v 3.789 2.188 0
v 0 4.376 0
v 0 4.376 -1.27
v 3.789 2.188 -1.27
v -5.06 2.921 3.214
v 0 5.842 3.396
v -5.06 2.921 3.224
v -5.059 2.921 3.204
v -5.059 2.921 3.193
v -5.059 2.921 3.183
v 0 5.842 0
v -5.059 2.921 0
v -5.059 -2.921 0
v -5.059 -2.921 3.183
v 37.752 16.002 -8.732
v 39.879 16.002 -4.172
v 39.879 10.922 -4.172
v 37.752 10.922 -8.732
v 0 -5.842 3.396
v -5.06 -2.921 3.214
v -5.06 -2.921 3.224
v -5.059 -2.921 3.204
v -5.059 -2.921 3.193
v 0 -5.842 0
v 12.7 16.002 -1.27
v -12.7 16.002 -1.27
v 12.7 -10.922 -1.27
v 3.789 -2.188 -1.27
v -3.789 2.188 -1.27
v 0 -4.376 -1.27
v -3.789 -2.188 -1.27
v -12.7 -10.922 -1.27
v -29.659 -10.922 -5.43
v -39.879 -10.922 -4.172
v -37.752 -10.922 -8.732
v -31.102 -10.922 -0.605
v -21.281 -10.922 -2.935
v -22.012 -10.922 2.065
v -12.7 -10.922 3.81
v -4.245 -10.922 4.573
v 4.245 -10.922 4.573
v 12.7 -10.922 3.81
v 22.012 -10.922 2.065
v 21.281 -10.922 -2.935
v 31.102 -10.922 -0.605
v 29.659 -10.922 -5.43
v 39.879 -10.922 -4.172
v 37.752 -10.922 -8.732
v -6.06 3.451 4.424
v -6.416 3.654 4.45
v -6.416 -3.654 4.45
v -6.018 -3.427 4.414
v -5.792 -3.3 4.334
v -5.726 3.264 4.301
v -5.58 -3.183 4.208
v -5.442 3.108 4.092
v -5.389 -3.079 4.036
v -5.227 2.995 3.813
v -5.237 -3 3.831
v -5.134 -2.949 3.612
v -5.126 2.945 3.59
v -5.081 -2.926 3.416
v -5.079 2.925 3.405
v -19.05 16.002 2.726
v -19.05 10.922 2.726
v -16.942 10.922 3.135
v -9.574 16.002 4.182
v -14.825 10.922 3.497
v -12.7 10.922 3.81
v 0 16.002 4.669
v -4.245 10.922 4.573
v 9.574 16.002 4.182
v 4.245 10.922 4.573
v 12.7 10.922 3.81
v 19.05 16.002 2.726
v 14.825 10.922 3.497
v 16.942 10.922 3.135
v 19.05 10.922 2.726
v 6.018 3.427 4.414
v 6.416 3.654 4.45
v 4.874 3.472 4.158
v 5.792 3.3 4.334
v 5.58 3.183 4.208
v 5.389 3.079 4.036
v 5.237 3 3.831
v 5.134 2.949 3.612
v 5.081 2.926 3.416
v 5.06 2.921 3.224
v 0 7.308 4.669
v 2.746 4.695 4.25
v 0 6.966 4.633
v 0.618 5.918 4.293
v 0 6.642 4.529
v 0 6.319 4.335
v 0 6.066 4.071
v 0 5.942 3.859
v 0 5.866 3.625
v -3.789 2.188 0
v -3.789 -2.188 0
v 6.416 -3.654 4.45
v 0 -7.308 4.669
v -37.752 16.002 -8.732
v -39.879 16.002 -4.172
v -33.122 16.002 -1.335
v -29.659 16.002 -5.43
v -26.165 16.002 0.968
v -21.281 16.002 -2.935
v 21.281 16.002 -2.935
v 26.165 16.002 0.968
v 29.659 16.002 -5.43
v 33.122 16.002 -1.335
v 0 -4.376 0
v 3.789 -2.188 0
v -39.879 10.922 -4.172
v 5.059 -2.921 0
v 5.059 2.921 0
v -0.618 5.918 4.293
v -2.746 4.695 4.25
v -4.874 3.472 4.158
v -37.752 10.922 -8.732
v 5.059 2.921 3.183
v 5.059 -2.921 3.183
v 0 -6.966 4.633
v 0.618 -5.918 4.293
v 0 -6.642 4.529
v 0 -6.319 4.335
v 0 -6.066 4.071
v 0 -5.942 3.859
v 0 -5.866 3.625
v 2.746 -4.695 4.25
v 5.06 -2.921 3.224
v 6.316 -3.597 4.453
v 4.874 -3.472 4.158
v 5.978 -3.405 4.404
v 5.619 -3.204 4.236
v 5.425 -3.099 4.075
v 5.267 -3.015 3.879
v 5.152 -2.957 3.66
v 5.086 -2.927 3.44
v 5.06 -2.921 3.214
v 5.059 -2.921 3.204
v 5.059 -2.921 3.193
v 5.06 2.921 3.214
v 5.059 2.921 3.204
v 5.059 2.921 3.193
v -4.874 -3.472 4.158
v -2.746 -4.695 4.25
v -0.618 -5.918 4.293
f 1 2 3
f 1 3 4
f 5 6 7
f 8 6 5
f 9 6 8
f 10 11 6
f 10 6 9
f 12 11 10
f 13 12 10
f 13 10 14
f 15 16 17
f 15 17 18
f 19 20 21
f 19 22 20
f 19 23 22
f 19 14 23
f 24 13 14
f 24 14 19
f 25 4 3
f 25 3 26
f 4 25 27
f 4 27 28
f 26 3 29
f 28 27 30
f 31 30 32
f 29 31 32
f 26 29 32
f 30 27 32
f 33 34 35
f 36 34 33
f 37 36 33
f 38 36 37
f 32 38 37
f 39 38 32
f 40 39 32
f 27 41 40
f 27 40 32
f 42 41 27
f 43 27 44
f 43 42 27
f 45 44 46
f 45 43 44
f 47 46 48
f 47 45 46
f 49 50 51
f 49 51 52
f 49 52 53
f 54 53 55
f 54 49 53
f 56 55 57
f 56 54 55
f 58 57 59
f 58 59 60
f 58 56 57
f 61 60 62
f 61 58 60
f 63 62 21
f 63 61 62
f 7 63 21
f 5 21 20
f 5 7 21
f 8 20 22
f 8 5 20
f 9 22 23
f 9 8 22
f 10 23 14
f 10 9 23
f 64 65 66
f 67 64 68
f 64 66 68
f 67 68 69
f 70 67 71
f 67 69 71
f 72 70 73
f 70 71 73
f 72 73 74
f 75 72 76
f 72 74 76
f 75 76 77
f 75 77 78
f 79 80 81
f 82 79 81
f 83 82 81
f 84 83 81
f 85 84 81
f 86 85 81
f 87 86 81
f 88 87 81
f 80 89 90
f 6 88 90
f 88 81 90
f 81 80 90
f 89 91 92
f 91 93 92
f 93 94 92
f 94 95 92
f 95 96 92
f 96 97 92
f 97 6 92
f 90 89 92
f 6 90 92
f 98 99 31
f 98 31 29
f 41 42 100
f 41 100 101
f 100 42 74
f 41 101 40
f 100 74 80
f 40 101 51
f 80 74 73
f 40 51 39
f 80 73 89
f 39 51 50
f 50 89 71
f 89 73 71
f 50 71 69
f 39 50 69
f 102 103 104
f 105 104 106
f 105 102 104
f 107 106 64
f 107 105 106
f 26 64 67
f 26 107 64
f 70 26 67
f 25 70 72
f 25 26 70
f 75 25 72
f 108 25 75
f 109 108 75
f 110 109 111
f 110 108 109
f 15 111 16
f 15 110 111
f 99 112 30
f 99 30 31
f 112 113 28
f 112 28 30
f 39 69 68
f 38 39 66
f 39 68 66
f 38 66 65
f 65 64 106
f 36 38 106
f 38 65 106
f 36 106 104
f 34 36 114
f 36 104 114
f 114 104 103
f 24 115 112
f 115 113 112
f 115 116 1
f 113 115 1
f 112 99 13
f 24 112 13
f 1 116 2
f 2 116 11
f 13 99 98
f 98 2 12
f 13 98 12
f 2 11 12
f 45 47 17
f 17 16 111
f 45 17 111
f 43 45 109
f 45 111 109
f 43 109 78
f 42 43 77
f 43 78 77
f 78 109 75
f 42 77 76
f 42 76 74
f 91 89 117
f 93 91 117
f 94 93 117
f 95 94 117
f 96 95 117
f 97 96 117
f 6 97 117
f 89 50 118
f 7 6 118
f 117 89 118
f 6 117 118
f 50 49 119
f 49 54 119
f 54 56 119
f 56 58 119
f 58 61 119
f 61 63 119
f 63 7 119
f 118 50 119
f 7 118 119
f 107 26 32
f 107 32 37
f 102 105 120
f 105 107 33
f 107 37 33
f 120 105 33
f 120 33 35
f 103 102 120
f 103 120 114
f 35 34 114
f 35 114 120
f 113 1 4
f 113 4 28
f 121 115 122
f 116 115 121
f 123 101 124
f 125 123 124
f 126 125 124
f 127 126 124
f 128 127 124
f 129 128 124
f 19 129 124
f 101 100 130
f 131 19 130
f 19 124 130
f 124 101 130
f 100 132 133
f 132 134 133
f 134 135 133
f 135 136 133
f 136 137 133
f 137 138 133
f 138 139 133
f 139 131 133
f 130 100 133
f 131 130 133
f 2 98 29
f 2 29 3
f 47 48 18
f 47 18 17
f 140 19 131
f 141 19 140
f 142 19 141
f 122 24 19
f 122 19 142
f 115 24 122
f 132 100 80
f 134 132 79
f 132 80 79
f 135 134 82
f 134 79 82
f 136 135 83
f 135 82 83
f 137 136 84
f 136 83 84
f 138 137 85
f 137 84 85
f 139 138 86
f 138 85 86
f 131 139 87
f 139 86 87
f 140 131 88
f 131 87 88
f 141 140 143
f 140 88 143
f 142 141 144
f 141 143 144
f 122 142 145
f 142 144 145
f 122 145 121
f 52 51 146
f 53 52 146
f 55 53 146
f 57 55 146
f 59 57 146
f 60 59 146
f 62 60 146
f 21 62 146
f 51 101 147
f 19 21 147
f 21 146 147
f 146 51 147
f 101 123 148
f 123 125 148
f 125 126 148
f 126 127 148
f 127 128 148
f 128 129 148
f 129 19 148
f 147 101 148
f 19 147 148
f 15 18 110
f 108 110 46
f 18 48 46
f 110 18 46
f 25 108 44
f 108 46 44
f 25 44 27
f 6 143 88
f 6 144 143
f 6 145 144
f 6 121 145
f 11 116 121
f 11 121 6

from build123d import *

# Parameters (mm, degrees)
SKETCH1_W                    = 25.4
SKETCH1_H                    = 21.844
BOLT_SIZE_WIDTH_HEIGHT_DEPTH = 7.62
FRONT_CURVE_DEPTH            = 22.844
SKETCH3_W                    = 25.4
SKETCH3_H                    = 21.844
REAR_CAP_DEPTH               = 1.27
WINGS_DEPTH                  = 21.844
HOOK_DEPTH_DEPTH             = 5.08
HOOK_HEIGHT_DEPTH            = 3.81
NUT_FLANGE_CLEARANCE_R       = 1.27
DECORATION_SIZE              = 2.54
CUT_EXTRUDE1_DEPTH           = 27.9240001


with BuildPart() as part:
    # Sketch1 → Bolt Size, Width, &Height (new body)
    with BuildSketch(Plane.XY):
        Rectangle(SKETCH1_W, SKETCH1_H)
        Polygon((0, 5.842), (-5.059320409, 2.921), (-5.059320409, -2.921), (0, -5.842), (5.059320409, -2.921), (5.059320409, 2.921), align=None, mode=Mode.SUBTRACT)
    extrude(amount=BOLT_SIZE_WIDTH_HEIGHT_DEPTH)

    # Sketch2 → Front Curve (cut, through all)
    with BuildSketch(Plane(origin=(0, 10.922, 0), x_dir=(1, 0, 0), z_dir=(0, 1, 0))):
        with BuildLine():
            Line((12.7, -7.62), (12.7, -3.81))
            ThreePointArc((12.7, -3.81), (0, -4.668549118), (-12.7, -3.81))
            Line((-12.7, -3.81), (-12.7, -7.62))
            Line((-12.7, -7.62), (12.7, -7.62))
        make_face()
    extrude(amount=-FRONT_CURVE_DEPTH, mode=Mode.SUBTRACT)

    # Sketch3 → Rear Cap (add)
    with BuildSketch(Plane(origin=(0, 0, 0), x_dir=(-1, 0, 0), z_dir=(0, 0, -1))):
        Rectangle(SKETCH3_W, SKETCH3_H)
        Polygon((-3.789320409, 2.187765158), (-3.789320409, -2.187765158), (0, -4.375530316), (3.789320409, -2.187765158), (3.789320409, 2.187765158), (0, 4.375530316), align=None, mode=Mode.SUBTRACT)
    extrude(amount=REAR_CAP_DEPTH)

    # Sketch6 → Wings (add)
    with BuildSketch(Plane.XZ.offset(10.922)):
        with BuildLine():
            ThreePointArc((-12.7, 3.81), (-26.59057897, 0.844499757), (-39.878681796, -4.17234179))
            Line((-39.878681796, -4.17234179), (-37.752420533, -8.732123784))
            ThreePointArc((-37.752420533, -8.732123784), (-25.500637389, -4.079733878), (-12.7, -1.27))
            Line((-12.7, -1.27), (-12.7, 3.81))
        make_face()
        with BuildLine():
            ThreePointArc((39.878681796, -4.17234179), (26.59057897, 0.844499757), (12.7, 3.81))
            Line((12.7, 3.81), (12.7, -1.27))
            ThreePointArc((12.7, -1.27), (25.500637389, -4.079733878), (37.752420533, -8.732123784))
            Line((37.752420533, -8.732123784), (39.878681796, -4.17234179))
        make_face()
    extrude(amount=-WINGS_DEPTH)

    # Sketch7 → Hook Depth (add)
    with BuildSketch(Plane(origin=(0, 10.922, 0), x_dir=(1, 0, 0), z_dir=(0, 1, 0))):
        with BuildLine():
            Line((12.7, 1.27), (-12.7, 1.27))
            ThreePointArc((-12.7, 1.27), (-25.500637389, 4.079733878), (-37.752420533, 8.732123784))
            Line((-37.752420533, 8.732123784), (-42.90498238, -2.317580756))
            ThreePointArc((-42.90498238, -2.317580756), (-31.916762044, -6.681838924), (-20.495660276, -9.738989543))
            Line((-20.495660276, -9.738989543), (-19.05, -2.725598334))
            ThreePointArc((-19.05, -2.725598334), (0, -4.668549118), (19.05, -2.725598334))
            Line((19.05, -2.725598334), (20.495660276, -9.738989543))
            ThreePointArc((20.495660276, -9.738989543), (31.916762044, -6.681838924), (42.90498238, -2.317580756))
            Line((42.90498238, -2.317580756), (37.752420533, 8.732123784))
            ThreePointArc((37.752420533, 8.732123784), (25.500637389, 4.079733878), (12.7, 1.27))
        make_face()
    extrude(amount=HOOK_DEPTH_DEPTH)

    # Sketch8 → Hook Height (add)
    with BuildSketch(Plane.XZ.offset(-10.922)):
        with BuildLine():
            ThreePointArc((-20.495660276, 9.738989543), (-31.916762044, 6.681838924), (-42.90498238, 2.317580756))
            Line((-42.90498238, 2.317580756), (-41.831531995, 0.015558977))
            ThreePointArc((-41.831531995, 0.015558977), (-31.118228667, 4.270626689), (-19.982874273, 7.251289698))
            Line((-19.982874273, 7.251289698), (-20.495660276, 9.738989543))
        make_face()
        with BuildLine():
            Line((41.831531995, 0.015558977), (42.90498238, 2.317580756))
            ThreePointArc((42.90498238, 2.317580756), (31.916762044, 6.681838924), (20.495660276, 9.738989543))
            Line((20.495660276, 9.738989543), (19.982874273, 7.251289698))
            ThreePointArc((19.982874273, 7.251289698), (31.118228667, 4.270626689), (41.831531995, 0.015558977))
        make_face()
    extrude(amount=HOOK_HEIGHT_DEPTH)

    # Nut Flange Clearance
    nut_flange_clearance_edges = [part.edges().sort_by_distance(p)[0] for p in [
        (5.059320409, 0, 4.532819603),
        (2.530342979, 4.3811058, 4.634616736),
        (-2.530342979, 4.3811058, 4.634616736),
        (-5.059320409, 0, 4.532819603),
        (-2.530342979, -4.3811058, 4.634616736),
        (2.530342979, -4.3811058, 4.634616736),
    ]]
    fillet(nut_flange_clearance_edges, radius=NUT_FLANGE_CLEARANCE_R)

    # Decoration
    decoration_edges = [part.edges().sort_by_distance(p)[0] for p in [
        (-42.368257188, 7.112, 1.166569866),
        (-20.239267274, 7.112, 8.49513962),
        (42.368257188, 7.112, 1.166569866),
        (20.239267274, 7.112, 8.49513962),
    ]]
    chamfer(decoration_edges, length=DECORATION_SIZE)

    # Sketch9 → Cut-Extrude1 (cut, through all)
    with BuildSketch(Plane(origin=(0, 16.002, 0), x_dir=(1, 0, 0), z_dir=(0, 1, 0))):
        with BuildLine():
            Line((42.90498238, -2.317580756), (39.878681796, 4.17234179))
            ThreePointArc((39.878681796, 4.17234179), (0, -4.668549118), (-39.878681796, 4.17234179))
            Line((-39.878681796, 4.17234179), (-42.90498238, -2.317580756))
            ThreePointArc((-42.90498238, -2.317580756), (0, -11.82938635), (42.90498238, -2.317580756))
        make_face()
    extrude(amount=-CUT_EXTRUDE1_DEPTH, mode=Mode.SUBTRACT)


solid = part.part
